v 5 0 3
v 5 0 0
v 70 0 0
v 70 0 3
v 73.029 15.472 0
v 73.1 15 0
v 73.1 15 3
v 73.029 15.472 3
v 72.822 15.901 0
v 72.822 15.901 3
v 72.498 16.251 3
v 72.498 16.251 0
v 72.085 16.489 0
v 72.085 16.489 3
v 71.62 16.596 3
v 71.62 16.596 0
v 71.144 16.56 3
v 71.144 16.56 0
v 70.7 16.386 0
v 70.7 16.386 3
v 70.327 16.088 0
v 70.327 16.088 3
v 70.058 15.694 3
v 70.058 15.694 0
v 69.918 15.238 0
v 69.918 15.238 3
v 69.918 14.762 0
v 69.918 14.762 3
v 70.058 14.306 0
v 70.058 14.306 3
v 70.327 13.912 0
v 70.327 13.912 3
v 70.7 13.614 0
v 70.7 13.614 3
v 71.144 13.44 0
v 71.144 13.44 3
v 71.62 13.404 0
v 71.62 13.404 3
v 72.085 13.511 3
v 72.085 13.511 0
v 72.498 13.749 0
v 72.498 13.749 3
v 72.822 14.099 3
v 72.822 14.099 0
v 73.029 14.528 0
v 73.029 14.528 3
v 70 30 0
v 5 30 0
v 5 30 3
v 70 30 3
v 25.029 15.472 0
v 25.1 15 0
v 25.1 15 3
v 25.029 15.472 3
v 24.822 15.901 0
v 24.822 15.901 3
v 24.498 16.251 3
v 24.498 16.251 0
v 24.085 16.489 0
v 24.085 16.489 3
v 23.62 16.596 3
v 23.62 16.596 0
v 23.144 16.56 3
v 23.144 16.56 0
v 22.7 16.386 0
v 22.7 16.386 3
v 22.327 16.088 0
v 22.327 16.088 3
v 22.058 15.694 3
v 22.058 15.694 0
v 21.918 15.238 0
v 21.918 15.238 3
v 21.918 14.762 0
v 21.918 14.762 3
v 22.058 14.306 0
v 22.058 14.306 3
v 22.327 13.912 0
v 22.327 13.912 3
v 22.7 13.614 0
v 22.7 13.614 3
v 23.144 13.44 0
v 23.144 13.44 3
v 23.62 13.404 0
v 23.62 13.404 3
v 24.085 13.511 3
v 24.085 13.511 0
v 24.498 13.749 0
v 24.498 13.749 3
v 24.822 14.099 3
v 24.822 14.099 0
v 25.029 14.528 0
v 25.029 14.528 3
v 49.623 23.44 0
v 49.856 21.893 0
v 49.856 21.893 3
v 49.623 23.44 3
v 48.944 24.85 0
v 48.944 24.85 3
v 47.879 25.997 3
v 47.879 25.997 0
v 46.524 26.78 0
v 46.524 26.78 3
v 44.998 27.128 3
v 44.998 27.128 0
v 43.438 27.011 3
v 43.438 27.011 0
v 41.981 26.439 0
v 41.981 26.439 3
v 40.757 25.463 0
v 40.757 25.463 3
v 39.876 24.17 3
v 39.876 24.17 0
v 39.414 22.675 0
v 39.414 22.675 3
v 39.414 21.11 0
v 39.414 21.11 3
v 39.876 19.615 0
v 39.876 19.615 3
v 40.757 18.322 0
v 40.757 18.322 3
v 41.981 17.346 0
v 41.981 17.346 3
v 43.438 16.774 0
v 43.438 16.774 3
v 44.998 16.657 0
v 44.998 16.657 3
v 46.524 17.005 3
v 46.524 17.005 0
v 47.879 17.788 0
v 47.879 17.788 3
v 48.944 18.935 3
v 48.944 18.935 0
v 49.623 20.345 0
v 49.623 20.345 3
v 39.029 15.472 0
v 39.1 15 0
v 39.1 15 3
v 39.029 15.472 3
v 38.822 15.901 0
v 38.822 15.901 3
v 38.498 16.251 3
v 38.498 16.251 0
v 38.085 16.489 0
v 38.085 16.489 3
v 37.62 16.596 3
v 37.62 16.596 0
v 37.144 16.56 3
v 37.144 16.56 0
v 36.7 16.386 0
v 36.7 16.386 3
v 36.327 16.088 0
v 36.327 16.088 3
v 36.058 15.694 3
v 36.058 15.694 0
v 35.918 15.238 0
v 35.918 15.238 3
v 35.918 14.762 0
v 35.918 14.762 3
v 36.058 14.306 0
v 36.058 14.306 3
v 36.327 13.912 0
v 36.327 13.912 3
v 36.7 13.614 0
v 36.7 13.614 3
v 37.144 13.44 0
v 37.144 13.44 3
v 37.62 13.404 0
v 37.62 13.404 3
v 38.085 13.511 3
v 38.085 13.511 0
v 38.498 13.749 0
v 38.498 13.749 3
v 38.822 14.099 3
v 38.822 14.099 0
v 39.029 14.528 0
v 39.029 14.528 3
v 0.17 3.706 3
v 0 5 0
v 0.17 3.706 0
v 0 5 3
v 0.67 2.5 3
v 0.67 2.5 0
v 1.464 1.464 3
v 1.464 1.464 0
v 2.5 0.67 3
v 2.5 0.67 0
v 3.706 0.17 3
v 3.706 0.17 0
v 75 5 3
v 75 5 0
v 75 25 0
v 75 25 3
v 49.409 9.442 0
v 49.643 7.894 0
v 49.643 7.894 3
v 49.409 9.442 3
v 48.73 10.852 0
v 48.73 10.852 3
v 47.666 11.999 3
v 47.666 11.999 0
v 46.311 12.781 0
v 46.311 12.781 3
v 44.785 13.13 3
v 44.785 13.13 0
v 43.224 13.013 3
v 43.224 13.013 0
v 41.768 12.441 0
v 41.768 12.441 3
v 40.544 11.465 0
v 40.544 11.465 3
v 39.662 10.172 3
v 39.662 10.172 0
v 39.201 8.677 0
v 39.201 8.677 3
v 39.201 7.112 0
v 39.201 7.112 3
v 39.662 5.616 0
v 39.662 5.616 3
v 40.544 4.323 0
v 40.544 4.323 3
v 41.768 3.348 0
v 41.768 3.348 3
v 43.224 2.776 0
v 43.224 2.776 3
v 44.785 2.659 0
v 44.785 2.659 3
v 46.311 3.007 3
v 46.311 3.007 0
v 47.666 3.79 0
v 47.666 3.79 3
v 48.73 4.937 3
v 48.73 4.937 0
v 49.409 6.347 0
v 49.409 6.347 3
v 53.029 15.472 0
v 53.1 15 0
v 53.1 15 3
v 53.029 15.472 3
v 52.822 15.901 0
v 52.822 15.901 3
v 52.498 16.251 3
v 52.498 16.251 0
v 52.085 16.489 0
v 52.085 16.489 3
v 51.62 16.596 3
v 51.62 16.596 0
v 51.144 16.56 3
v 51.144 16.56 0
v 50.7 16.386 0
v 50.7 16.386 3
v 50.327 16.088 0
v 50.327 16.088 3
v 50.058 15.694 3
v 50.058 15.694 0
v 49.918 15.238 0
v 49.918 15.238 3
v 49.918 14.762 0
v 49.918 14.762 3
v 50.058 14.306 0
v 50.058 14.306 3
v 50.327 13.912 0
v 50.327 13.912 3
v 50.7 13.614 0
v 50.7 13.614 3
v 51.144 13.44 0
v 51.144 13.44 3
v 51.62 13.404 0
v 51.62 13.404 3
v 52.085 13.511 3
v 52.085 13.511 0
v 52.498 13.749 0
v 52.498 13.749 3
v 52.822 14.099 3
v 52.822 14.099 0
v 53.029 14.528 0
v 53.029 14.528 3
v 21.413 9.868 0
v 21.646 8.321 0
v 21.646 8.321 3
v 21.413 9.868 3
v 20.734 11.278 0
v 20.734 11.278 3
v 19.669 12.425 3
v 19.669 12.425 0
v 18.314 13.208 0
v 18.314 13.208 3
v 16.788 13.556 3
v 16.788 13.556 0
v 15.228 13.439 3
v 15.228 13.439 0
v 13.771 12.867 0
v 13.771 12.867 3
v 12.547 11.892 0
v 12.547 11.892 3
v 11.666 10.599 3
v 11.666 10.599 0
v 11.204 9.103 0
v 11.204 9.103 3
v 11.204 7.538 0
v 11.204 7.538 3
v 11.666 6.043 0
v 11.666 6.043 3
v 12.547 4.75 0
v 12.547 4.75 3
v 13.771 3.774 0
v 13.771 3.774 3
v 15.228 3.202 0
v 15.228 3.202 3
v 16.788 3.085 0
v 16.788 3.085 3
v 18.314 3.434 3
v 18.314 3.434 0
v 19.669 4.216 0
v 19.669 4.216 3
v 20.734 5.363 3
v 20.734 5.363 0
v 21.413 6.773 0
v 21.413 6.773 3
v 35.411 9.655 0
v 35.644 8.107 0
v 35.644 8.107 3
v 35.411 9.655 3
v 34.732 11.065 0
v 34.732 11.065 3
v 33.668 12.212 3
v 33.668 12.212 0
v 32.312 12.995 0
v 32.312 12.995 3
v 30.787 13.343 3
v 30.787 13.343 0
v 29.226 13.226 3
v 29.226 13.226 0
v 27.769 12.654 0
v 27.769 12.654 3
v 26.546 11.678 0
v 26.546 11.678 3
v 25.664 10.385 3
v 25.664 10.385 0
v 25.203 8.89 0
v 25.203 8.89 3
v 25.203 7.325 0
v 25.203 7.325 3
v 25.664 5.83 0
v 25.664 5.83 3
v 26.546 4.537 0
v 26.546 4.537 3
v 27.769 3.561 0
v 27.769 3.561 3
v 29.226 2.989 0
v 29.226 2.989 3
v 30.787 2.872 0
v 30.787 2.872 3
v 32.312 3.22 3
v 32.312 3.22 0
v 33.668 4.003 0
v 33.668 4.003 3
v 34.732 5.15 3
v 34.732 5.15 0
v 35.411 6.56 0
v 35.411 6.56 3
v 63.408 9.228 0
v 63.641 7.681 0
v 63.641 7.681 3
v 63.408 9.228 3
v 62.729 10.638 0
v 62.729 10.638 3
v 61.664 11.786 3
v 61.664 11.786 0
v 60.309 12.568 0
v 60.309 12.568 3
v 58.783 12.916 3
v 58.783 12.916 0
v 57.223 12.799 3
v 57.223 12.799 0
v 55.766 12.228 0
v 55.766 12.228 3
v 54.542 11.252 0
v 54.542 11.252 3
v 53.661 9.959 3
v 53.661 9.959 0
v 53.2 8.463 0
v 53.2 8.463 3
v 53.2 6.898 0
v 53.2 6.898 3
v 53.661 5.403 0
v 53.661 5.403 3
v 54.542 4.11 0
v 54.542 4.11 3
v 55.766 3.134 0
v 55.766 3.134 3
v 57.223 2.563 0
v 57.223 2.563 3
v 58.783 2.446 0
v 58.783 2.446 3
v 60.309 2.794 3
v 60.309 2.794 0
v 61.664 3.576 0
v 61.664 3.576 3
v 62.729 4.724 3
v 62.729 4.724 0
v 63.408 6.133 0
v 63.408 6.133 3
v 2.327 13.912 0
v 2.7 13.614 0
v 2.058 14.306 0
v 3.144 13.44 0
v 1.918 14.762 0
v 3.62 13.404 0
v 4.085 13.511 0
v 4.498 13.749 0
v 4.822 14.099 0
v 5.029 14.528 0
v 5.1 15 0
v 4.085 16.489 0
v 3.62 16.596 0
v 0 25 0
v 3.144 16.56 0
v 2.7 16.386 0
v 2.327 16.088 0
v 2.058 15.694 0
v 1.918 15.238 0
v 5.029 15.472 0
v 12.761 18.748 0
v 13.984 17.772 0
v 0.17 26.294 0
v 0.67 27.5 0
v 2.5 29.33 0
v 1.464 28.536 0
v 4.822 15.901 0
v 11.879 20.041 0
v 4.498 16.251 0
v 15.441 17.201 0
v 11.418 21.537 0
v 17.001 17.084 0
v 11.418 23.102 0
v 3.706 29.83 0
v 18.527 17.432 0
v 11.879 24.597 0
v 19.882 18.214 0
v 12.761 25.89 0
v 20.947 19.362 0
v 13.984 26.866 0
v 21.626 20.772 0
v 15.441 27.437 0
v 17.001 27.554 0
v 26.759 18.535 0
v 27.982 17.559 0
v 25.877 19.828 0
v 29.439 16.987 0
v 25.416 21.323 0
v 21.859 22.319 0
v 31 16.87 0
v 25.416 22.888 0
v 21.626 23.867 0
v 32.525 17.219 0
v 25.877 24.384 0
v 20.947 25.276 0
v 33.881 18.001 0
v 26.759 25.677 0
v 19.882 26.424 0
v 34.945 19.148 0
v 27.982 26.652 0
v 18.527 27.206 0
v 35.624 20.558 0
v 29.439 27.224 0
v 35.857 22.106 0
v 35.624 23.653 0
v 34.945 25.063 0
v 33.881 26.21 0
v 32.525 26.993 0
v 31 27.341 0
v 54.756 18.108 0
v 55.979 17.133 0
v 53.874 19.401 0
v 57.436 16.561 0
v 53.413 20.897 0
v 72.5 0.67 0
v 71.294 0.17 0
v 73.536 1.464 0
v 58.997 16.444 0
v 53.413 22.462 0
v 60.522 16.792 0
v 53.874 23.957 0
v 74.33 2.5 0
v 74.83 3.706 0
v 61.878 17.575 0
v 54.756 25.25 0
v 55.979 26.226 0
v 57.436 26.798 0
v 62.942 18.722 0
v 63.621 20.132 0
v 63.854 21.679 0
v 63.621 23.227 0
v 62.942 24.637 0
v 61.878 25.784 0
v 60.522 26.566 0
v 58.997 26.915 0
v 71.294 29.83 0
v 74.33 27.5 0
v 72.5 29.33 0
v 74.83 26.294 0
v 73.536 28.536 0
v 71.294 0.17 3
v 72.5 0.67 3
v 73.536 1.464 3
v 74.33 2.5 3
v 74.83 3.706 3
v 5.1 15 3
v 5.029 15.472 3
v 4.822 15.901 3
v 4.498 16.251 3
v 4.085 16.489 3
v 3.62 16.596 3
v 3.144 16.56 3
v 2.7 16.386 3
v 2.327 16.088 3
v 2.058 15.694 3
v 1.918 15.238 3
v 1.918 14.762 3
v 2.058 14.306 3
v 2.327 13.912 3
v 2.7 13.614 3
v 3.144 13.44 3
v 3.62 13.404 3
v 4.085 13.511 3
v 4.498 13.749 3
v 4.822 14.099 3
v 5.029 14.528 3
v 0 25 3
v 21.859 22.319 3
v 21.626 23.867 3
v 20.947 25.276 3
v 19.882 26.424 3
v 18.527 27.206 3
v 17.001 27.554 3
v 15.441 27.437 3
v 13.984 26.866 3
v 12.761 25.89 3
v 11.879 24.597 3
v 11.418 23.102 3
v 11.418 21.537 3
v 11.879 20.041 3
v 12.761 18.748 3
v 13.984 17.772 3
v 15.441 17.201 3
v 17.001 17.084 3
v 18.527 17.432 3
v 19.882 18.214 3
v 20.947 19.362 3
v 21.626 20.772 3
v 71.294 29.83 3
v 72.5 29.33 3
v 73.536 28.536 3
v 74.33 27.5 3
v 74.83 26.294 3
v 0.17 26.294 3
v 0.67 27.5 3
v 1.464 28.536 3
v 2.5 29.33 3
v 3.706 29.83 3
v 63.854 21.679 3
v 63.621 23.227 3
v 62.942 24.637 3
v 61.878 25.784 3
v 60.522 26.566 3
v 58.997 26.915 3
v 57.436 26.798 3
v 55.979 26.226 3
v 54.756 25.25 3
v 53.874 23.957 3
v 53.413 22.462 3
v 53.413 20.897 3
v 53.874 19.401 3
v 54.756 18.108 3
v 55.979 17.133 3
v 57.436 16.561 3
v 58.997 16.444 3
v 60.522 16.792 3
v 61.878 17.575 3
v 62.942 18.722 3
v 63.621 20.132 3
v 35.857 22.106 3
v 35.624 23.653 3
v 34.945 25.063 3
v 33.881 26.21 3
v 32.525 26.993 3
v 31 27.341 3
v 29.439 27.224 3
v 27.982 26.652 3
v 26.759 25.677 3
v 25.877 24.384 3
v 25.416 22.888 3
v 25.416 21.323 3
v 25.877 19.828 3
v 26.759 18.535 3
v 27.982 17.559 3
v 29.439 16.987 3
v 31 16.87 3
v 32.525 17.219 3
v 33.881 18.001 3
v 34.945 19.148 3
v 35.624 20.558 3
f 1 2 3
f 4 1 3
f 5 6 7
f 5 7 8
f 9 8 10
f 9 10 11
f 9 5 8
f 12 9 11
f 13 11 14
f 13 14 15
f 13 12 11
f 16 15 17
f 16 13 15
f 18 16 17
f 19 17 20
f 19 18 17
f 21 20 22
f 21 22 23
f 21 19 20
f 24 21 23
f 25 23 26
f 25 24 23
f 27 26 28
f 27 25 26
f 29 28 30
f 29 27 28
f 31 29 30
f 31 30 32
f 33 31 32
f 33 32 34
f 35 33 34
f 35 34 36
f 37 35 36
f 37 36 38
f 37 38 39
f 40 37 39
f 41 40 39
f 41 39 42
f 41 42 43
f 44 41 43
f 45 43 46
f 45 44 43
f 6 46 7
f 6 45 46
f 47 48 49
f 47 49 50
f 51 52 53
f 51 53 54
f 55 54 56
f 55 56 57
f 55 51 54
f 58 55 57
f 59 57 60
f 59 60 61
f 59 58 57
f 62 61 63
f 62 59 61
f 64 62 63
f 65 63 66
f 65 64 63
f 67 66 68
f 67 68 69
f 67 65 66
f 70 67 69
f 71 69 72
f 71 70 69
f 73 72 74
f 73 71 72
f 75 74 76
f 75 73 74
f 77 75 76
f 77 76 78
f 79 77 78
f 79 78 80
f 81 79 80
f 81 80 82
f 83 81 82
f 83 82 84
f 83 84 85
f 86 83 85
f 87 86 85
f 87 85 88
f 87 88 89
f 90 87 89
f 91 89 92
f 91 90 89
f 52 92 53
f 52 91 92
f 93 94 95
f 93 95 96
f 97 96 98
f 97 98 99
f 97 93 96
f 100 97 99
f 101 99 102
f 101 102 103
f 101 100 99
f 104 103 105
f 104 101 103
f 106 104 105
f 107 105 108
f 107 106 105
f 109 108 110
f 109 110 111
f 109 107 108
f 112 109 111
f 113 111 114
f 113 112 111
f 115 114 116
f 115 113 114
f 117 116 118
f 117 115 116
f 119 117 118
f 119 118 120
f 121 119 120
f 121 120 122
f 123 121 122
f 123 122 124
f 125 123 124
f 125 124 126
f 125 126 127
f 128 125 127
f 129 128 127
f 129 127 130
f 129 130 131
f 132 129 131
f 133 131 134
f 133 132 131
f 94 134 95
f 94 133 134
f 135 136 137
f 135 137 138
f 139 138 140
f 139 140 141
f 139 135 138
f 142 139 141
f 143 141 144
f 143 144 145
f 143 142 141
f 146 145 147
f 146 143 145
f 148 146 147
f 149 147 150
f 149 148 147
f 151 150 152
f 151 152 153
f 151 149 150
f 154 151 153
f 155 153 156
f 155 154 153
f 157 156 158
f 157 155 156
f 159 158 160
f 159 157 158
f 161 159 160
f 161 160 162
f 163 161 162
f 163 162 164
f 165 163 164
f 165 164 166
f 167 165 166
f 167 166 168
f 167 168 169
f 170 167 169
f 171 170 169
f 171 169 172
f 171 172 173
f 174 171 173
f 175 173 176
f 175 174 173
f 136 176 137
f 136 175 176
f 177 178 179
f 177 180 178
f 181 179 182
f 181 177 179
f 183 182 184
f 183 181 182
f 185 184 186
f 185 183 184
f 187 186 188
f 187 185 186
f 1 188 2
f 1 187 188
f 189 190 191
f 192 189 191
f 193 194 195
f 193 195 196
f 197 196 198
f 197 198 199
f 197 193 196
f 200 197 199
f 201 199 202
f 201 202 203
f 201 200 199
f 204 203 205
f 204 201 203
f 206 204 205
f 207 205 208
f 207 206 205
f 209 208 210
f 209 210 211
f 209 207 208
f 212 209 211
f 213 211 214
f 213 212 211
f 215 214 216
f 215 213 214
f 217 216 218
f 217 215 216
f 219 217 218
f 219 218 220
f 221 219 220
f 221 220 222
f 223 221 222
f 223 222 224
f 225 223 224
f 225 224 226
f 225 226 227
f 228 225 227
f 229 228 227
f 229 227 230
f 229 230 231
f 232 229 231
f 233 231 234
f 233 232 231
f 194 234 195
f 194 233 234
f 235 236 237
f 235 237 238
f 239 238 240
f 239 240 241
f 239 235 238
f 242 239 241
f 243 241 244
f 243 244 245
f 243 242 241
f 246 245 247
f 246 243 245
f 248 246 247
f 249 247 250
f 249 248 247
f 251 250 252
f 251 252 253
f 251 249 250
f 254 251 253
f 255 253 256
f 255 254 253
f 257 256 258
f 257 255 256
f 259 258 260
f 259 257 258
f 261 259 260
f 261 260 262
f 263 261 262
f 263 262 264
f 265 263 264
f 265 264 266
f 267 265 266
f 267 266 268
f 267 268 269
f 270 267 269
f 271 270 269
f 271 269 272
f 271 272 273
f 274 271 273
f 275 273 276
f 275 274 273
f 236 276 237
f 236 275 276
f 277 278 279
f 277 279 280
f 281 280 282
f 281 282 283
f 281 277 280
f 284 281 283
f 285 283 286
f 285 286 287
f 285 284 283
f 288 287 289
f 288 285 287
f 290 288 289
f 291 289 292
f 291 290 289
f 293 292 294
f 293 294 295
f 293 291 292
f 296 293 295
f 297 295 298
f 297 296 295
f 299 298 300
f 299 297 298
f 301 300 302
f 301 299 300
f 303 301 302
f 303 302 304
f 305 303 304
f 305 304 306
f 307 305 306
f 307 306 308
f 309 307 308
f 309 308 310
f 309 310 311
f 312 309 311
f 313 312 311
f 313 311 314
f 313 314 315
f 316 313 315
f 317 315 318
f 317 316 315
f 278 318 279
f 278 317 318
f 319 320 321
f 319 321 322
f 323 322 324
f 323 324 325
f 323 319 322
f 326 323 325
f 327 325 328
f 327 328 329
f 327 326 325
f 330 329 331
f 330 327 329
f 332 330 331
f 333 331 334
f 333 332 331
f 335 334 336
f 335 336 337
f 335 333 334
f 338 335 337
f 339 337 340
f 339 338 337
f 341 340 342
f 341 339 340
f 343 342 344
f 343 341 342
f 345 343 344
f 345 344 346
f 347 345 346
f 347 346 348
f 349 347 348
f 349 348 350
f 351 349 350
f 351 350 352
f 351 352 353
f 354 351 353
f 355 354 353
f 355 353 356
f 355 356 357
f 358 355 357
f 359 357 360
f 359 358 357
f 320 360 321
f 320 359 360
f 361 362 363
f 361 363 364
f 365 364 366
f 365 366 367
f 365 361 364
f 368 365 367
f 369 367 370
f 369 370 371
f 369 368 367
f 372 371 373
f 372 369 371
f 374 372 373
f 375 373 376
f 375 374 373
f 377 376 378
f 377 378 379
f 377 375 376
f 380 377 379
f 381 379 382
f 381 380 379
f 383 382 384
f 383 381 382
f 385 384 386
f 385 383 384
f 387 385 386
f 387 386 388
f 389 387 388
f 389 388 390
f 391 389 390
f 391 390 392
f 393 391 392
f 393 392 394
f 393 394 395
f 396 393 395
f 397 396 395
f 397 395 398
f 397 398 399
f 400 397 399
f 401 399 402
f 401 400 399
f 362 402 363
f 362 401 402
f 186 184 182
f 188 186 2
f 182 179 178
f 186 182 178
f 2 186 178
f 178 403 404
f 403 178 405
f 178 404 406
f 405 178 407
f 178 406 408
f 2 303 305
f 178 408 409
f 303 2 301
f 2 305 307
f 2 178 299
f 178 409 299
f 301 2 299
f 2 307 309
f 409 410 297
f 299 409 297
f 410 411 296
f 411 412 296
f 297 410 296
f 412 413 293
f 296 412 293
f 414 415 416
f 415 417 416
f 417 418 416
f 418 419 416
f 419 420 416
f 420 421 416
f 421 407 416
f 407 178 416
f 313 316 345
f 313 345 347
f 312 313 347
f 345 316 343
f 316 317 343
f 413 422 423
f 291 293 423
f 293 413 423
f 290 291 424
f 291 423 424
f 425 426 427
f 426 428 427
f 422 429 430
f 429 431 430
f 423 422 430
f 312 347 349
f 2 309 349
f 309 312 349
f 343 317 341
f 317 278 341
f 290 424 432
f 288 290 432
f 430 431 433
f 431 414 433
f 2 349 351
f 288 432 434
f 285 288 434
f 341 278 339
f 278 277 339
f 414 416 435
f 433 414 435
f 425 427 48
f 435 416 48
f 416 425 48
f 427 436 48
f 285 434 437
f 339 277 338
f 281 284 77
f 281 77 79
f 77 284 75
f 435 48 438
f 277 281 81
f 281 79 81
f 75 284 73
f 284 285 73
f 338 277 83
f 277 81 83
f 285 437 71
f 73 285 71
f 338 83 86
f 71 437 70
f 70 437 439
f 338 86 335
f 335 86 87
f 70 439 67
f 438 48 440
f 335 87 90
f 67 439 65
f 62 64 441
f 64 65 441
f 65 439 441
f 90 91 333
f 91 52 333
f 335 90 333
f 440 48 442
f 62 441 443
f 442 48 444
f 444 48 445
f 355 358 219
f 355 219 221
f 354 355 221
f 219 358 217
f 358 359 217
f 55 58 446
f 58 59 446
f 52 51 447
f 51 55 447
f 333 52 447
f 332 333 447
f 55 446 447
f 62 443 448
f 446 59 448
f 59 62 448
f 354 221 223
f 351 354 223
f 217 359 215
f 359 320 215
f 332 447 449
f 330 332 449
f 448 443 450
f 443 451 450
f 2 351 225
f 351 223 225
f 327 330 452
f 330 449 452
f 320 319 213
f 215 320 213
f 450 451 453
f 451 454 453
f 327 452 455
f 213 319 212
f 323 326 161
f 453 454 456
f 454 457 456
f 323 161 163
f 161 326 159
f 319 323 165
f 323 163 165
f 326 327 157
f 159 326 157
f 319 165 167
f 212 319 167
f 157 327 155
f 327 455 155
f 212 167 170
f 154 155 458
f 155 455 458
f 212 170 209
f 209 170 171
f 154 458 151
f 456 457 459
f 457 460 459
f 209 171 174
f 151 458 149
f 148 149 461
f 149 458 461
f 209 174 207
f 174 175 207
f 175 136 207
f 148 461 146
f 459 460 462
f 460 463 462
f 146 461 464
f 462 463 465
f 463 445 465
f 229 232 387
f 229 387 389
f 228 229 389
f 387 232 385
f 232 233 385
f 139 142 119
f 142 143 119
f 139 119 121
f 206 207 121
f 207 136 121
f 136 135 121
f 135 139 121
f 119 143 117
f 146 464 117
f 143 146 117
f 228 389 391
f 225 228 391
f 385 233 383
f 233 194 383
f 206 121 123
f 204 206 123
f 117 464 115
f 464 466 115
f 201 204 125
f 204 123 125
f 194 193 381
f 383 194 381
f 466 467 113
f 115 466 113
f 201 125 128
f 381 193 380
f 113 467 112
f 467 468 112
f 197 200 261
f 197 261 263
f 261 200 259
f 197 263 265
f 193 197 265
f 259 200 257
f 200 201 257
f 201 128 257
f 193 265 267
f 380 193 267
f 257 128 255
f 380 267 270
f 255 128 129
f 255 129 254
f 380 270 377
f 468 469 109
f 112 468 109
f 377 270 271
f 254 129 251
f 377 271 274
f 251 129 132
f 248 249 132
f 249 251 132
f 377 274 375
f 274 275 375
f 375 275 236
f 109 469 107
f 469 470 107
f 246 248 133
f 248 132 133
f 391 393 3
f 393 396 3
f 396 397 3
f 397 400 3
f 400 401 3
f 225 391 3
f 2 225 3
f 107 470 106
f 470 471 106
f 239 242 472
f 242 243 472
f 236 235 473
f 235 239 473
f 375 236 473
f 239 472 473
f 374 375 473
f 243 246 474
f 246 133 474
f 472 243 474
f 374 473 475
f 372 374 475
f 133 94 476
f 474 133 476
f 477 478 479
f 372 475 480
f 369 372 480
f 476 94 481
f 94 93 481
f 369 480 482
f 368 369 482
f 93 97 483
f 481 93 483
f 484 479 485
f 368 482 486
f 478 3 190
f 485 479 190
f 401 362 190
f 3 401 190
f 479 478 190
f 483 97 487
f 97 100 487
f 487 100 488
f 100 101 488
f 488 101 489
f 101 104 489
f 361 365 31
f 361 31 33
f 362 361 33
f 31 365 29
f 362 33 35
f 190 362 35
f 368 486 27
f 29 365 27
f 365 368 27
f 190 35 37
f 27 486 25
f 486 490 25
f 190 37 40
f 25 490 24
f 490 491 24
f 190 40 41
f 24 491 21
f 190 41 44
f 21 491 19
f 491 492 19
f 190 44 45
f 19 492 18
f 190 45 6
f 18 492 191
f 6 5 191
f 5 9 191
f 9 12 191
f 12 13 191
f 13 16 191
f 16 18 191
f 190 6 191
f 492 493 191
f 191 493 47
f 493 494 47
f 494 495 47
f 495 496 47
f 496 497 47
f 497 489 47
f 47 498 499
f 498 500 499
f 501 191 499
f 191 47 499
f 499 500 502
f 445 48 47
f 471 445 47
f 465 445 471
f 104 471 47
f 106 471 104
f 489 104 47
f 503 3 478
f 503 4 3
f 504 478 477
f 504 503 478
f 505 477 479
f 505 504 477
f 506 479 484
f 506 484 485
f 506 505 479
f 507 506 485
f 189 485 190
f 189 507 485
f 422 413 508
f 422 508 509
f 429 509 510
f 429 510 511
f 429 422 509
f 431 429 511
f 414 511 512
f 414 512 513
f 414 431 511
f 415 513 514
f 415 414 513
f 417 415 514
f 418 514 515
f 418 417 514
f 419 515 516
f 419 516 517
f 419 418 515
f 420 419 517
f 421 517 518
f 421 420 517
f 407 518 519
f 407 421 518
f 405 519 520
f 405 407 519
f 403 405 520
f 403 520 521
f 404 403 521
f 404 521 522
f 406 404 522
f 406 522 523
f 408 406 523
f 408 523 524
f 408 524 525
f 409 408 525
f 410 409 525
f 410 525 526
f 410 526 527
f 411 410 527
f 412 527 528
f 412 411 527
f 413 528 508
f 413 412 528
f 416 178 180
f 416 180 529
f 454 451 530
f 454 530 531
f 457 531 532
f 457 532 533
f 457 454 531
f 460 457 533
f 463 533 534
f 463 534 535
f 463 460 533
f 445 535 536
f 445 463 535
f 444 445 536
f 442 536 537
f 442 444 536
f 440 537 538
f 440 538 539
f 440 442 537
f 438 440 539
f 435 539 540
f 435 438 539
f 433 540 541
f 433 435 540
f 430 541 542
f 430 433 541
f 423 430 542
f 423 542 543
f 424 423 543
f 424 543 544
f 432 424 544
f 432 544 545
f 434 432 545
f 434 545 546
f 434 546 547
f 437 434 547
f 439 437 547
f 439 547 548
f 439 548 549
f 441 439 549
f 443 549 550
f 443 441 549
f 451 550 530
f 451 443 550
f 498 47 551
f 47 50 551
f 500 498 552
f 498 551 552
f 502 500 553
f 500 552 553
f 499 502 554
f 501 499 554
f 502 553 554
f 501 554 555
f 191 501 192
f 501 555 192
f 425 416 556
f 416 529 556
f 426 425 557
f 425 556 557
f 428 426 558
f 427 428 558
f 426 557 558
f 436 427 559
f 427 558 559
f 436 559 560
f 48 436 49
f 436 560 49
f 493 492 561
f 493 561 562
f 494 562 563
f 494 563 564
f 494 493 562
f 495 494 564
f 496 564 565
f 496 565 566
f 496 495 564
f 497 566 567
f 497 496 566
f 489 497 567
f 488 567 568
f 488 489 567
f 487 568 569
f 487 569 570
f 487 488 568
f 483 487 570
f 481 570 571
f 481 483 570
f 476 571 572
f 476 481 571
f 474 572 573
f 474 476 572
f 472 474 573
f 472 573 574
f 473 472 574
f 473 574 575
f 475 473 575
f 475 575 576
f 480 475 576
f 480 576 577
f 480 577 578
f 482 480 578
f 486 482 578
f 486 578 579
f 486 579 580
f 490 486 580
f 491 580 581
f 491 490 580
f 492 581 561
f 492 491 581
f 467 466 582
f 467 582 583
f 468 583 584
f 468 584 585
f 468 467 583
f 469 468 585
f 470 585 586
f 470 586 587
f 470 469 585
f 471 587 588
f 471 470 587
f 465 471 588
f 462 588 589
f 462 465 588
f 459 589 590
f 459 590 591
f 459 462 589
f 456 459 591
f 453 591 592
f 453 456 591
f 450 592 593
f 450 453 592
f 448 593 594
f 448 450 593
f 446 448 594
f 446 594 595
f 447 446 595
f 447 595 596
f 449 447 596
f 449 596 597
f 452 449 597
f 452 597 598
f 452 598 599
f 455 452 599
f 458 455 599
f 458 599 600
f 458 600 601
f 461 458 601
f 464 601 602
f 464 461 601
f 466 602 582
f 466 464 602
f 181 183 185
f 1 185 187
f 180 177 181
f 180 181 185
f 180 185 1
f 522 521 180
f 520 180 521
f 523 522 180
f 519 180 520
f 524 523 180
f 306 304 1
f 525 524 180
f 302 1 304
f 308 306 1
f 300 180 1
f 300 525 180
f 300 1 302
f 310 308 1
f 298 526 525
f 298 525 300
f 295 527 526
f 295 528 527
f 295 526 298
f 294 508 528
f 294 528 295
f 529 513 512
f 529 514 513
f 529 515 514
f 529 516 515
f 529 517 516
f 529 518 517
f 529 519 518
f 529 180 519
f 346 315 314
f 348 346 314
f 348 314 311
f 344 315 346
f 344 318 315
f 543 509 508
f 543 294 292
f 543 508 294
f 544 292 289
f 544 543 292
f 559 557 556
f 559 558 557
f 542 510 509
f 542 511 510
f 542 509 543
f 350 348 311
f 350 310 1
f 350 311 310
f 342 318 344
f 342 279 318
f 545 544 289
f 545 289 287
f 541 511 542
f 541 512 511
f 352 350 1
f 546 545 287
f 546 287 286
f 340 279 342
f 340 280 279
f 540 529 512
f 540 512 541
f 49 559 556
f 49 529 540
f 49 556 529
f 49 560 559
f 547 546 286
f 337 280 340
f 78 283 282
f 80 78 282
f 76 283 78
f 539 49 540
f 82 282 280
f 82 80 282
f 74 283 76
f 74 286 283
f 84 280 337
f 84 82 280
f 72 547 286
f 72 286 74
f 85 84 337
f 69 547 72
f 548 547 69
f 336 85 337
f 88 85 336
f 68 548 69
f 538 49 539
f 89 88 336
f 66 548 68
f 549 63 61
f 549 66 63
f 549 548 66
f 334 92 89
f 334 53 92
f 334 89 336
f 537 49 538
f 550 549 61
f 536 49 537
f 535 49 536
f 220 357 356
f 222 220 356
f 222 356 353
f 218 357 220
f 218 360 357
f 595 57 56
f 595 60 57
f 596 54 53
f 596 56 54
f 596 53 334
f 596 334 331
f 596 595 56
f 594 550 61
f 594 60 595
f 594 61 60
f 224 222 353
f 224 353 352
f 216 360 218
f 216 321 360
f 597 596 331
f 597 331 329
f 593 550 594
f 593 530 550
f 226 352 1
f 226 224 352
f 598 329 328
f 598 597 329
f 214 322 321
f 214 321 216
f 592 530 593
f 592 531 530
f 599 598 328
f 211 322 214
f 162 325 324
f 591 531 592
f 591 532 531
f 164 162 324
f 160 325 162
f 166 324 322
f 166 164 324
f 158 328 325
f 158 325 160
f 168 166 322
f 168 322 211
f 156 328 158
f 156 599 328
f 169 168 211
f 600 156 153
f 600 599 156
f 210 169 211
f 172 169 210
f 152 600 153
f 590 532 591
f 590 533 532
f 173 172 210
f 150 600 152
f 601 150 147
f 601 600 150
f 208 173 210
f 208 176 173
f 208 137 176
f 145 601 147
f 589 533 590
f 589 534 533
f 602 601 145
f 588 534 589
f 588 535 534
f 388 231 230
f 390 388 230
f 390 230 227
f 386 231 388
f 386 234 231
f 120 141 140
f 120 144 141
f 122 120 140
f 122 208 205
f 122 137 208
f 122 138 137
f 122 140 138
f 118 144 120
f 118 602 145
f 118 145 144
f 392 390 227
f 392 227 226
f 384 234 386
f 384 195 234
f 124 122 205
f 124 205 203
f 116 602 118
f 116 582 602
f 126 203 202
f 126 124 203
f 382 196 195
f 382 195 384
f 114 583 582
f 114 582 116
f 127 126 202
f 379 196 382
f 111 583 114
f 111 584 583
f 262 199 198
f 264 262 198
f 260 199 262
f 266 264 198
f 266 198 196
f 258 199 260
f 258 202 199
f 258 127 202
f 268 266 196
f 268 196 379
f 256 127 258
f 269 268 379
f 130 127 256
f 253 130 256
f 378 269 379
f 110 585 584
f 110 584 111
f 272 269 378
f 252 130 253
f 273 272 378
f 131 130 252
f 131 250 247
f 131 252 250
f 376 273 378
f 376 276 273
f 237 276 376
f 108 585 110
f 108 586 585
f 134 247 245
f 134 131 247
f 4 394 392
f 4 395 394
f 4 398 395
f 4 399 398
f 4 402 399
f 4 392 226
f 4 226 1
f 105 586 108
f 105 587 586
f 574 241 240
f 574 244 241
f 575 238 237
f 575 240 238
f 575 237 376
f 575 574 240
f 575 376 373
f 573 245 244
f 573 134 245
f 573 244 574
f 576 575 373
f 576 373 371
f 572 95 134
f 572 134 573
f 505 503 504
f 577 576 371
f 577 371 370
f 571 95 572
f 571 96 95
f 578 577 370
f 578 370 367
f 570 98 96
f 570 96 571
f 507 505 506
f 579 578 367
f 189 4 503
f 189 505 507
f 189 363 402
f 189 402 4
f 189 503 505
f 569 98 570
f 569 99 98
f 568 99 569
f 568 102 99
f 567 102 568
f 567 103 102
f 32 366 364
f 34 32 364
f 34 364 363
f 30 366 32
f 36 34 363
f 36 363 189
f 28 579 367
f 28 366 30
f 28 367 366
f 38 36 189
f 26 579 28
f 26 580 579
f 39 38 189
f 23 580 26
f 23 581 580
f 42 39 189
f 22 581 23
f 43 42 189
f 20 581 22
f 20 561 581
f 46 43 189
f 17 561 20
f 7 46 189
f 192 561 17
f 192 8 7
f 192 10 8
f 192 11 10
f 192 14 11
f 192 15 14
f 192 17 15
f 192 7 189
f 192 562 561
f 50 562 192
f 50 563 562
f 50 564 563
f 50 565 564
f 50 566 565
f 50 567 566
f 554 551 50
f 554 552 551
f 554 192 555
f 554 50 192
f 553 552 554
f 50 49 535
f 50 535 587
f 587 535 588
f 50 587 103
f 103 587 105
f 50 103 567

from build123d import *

# Parameters (mm, degrees)
SKETCH_W   = 75
SKETCH_H   = 30
SKETCH_R   = 5.25
SKETCH_R_2 = 1.6
PAD_DEPTH  = 3
FILLET_R   = 5


with BuildPart() as part:
    # Sketch → Pad (new body)
    with BuildSketch(Plane.XY):
        with Locations((37.5, 15)):
            Rectangle(SKETCH_W, SKETCH_H)
        with Locations((16.609054, 22.319043)):
            Circle(SKETCH_R, mode=Mode.SUBTRACT)
        with Locations((37.5, 15)):
            Circle(SKETCH_R_2, mode=Mode.SUBTRACT)
        with Locations((3.5, 15)):
            Circle(SKETCH_R_2, mode=Mode.SUBTRACT)
        with Locations((71.5, 15)):
            Circle(SKETCH_R_2, mode=Mode.SUBTRACT)
        with Locations((23.5, 15)):
            Circle(SKETCH_R_2, mode=Mode.SUBTRACT)
        with Locations((51.5, 15)):
            Circle(SKETCH_R_2, mode=Mode.SUBTRACT)
        with Locations((30.60743, 22.105806)):
            Circle(SKETCH_R, mode=Mode.SUBTRACT)
        with Locations((44.605806, 21.89257)):
            Circle(SKETCH_R, mode=Mode.SUBTRACT)
        with Locations((58.604182, 21.679333)):
            Circle(SKETCH_R, mode=Mode.SUBTRACT)
        with Locations((16.395818, 8.320667)):
            Circle(SKETCH_R, mode=Mode.SUBTRACT)
        with Locations((30.394194, 8.10743)):
            Circle(SKETCH_R, mode=Mode.SUBTRACT)
        with Locations((44.39257, 7.894194)):
            Circle(SKETCH_R, mode=Mode.SUBTRACT)
        with Locations((58.390946, 7.680957)):
            Circle(SKETCH_R, mode=Mode.SUBTRACT)
    extrude(amount=PAD_DEPTH)

    # Fillet
    fillet_edges = [part.edges().sort_by_distance(p)[0] for p in [
        (0, 0, 1.5),
        (75, 0, 1.5),
        (75, 30, 1.5),
        (0, 30, 1.5),
    ]]
    fillet(fillet_edges, radius=FILLET_R)


solid = part.part
